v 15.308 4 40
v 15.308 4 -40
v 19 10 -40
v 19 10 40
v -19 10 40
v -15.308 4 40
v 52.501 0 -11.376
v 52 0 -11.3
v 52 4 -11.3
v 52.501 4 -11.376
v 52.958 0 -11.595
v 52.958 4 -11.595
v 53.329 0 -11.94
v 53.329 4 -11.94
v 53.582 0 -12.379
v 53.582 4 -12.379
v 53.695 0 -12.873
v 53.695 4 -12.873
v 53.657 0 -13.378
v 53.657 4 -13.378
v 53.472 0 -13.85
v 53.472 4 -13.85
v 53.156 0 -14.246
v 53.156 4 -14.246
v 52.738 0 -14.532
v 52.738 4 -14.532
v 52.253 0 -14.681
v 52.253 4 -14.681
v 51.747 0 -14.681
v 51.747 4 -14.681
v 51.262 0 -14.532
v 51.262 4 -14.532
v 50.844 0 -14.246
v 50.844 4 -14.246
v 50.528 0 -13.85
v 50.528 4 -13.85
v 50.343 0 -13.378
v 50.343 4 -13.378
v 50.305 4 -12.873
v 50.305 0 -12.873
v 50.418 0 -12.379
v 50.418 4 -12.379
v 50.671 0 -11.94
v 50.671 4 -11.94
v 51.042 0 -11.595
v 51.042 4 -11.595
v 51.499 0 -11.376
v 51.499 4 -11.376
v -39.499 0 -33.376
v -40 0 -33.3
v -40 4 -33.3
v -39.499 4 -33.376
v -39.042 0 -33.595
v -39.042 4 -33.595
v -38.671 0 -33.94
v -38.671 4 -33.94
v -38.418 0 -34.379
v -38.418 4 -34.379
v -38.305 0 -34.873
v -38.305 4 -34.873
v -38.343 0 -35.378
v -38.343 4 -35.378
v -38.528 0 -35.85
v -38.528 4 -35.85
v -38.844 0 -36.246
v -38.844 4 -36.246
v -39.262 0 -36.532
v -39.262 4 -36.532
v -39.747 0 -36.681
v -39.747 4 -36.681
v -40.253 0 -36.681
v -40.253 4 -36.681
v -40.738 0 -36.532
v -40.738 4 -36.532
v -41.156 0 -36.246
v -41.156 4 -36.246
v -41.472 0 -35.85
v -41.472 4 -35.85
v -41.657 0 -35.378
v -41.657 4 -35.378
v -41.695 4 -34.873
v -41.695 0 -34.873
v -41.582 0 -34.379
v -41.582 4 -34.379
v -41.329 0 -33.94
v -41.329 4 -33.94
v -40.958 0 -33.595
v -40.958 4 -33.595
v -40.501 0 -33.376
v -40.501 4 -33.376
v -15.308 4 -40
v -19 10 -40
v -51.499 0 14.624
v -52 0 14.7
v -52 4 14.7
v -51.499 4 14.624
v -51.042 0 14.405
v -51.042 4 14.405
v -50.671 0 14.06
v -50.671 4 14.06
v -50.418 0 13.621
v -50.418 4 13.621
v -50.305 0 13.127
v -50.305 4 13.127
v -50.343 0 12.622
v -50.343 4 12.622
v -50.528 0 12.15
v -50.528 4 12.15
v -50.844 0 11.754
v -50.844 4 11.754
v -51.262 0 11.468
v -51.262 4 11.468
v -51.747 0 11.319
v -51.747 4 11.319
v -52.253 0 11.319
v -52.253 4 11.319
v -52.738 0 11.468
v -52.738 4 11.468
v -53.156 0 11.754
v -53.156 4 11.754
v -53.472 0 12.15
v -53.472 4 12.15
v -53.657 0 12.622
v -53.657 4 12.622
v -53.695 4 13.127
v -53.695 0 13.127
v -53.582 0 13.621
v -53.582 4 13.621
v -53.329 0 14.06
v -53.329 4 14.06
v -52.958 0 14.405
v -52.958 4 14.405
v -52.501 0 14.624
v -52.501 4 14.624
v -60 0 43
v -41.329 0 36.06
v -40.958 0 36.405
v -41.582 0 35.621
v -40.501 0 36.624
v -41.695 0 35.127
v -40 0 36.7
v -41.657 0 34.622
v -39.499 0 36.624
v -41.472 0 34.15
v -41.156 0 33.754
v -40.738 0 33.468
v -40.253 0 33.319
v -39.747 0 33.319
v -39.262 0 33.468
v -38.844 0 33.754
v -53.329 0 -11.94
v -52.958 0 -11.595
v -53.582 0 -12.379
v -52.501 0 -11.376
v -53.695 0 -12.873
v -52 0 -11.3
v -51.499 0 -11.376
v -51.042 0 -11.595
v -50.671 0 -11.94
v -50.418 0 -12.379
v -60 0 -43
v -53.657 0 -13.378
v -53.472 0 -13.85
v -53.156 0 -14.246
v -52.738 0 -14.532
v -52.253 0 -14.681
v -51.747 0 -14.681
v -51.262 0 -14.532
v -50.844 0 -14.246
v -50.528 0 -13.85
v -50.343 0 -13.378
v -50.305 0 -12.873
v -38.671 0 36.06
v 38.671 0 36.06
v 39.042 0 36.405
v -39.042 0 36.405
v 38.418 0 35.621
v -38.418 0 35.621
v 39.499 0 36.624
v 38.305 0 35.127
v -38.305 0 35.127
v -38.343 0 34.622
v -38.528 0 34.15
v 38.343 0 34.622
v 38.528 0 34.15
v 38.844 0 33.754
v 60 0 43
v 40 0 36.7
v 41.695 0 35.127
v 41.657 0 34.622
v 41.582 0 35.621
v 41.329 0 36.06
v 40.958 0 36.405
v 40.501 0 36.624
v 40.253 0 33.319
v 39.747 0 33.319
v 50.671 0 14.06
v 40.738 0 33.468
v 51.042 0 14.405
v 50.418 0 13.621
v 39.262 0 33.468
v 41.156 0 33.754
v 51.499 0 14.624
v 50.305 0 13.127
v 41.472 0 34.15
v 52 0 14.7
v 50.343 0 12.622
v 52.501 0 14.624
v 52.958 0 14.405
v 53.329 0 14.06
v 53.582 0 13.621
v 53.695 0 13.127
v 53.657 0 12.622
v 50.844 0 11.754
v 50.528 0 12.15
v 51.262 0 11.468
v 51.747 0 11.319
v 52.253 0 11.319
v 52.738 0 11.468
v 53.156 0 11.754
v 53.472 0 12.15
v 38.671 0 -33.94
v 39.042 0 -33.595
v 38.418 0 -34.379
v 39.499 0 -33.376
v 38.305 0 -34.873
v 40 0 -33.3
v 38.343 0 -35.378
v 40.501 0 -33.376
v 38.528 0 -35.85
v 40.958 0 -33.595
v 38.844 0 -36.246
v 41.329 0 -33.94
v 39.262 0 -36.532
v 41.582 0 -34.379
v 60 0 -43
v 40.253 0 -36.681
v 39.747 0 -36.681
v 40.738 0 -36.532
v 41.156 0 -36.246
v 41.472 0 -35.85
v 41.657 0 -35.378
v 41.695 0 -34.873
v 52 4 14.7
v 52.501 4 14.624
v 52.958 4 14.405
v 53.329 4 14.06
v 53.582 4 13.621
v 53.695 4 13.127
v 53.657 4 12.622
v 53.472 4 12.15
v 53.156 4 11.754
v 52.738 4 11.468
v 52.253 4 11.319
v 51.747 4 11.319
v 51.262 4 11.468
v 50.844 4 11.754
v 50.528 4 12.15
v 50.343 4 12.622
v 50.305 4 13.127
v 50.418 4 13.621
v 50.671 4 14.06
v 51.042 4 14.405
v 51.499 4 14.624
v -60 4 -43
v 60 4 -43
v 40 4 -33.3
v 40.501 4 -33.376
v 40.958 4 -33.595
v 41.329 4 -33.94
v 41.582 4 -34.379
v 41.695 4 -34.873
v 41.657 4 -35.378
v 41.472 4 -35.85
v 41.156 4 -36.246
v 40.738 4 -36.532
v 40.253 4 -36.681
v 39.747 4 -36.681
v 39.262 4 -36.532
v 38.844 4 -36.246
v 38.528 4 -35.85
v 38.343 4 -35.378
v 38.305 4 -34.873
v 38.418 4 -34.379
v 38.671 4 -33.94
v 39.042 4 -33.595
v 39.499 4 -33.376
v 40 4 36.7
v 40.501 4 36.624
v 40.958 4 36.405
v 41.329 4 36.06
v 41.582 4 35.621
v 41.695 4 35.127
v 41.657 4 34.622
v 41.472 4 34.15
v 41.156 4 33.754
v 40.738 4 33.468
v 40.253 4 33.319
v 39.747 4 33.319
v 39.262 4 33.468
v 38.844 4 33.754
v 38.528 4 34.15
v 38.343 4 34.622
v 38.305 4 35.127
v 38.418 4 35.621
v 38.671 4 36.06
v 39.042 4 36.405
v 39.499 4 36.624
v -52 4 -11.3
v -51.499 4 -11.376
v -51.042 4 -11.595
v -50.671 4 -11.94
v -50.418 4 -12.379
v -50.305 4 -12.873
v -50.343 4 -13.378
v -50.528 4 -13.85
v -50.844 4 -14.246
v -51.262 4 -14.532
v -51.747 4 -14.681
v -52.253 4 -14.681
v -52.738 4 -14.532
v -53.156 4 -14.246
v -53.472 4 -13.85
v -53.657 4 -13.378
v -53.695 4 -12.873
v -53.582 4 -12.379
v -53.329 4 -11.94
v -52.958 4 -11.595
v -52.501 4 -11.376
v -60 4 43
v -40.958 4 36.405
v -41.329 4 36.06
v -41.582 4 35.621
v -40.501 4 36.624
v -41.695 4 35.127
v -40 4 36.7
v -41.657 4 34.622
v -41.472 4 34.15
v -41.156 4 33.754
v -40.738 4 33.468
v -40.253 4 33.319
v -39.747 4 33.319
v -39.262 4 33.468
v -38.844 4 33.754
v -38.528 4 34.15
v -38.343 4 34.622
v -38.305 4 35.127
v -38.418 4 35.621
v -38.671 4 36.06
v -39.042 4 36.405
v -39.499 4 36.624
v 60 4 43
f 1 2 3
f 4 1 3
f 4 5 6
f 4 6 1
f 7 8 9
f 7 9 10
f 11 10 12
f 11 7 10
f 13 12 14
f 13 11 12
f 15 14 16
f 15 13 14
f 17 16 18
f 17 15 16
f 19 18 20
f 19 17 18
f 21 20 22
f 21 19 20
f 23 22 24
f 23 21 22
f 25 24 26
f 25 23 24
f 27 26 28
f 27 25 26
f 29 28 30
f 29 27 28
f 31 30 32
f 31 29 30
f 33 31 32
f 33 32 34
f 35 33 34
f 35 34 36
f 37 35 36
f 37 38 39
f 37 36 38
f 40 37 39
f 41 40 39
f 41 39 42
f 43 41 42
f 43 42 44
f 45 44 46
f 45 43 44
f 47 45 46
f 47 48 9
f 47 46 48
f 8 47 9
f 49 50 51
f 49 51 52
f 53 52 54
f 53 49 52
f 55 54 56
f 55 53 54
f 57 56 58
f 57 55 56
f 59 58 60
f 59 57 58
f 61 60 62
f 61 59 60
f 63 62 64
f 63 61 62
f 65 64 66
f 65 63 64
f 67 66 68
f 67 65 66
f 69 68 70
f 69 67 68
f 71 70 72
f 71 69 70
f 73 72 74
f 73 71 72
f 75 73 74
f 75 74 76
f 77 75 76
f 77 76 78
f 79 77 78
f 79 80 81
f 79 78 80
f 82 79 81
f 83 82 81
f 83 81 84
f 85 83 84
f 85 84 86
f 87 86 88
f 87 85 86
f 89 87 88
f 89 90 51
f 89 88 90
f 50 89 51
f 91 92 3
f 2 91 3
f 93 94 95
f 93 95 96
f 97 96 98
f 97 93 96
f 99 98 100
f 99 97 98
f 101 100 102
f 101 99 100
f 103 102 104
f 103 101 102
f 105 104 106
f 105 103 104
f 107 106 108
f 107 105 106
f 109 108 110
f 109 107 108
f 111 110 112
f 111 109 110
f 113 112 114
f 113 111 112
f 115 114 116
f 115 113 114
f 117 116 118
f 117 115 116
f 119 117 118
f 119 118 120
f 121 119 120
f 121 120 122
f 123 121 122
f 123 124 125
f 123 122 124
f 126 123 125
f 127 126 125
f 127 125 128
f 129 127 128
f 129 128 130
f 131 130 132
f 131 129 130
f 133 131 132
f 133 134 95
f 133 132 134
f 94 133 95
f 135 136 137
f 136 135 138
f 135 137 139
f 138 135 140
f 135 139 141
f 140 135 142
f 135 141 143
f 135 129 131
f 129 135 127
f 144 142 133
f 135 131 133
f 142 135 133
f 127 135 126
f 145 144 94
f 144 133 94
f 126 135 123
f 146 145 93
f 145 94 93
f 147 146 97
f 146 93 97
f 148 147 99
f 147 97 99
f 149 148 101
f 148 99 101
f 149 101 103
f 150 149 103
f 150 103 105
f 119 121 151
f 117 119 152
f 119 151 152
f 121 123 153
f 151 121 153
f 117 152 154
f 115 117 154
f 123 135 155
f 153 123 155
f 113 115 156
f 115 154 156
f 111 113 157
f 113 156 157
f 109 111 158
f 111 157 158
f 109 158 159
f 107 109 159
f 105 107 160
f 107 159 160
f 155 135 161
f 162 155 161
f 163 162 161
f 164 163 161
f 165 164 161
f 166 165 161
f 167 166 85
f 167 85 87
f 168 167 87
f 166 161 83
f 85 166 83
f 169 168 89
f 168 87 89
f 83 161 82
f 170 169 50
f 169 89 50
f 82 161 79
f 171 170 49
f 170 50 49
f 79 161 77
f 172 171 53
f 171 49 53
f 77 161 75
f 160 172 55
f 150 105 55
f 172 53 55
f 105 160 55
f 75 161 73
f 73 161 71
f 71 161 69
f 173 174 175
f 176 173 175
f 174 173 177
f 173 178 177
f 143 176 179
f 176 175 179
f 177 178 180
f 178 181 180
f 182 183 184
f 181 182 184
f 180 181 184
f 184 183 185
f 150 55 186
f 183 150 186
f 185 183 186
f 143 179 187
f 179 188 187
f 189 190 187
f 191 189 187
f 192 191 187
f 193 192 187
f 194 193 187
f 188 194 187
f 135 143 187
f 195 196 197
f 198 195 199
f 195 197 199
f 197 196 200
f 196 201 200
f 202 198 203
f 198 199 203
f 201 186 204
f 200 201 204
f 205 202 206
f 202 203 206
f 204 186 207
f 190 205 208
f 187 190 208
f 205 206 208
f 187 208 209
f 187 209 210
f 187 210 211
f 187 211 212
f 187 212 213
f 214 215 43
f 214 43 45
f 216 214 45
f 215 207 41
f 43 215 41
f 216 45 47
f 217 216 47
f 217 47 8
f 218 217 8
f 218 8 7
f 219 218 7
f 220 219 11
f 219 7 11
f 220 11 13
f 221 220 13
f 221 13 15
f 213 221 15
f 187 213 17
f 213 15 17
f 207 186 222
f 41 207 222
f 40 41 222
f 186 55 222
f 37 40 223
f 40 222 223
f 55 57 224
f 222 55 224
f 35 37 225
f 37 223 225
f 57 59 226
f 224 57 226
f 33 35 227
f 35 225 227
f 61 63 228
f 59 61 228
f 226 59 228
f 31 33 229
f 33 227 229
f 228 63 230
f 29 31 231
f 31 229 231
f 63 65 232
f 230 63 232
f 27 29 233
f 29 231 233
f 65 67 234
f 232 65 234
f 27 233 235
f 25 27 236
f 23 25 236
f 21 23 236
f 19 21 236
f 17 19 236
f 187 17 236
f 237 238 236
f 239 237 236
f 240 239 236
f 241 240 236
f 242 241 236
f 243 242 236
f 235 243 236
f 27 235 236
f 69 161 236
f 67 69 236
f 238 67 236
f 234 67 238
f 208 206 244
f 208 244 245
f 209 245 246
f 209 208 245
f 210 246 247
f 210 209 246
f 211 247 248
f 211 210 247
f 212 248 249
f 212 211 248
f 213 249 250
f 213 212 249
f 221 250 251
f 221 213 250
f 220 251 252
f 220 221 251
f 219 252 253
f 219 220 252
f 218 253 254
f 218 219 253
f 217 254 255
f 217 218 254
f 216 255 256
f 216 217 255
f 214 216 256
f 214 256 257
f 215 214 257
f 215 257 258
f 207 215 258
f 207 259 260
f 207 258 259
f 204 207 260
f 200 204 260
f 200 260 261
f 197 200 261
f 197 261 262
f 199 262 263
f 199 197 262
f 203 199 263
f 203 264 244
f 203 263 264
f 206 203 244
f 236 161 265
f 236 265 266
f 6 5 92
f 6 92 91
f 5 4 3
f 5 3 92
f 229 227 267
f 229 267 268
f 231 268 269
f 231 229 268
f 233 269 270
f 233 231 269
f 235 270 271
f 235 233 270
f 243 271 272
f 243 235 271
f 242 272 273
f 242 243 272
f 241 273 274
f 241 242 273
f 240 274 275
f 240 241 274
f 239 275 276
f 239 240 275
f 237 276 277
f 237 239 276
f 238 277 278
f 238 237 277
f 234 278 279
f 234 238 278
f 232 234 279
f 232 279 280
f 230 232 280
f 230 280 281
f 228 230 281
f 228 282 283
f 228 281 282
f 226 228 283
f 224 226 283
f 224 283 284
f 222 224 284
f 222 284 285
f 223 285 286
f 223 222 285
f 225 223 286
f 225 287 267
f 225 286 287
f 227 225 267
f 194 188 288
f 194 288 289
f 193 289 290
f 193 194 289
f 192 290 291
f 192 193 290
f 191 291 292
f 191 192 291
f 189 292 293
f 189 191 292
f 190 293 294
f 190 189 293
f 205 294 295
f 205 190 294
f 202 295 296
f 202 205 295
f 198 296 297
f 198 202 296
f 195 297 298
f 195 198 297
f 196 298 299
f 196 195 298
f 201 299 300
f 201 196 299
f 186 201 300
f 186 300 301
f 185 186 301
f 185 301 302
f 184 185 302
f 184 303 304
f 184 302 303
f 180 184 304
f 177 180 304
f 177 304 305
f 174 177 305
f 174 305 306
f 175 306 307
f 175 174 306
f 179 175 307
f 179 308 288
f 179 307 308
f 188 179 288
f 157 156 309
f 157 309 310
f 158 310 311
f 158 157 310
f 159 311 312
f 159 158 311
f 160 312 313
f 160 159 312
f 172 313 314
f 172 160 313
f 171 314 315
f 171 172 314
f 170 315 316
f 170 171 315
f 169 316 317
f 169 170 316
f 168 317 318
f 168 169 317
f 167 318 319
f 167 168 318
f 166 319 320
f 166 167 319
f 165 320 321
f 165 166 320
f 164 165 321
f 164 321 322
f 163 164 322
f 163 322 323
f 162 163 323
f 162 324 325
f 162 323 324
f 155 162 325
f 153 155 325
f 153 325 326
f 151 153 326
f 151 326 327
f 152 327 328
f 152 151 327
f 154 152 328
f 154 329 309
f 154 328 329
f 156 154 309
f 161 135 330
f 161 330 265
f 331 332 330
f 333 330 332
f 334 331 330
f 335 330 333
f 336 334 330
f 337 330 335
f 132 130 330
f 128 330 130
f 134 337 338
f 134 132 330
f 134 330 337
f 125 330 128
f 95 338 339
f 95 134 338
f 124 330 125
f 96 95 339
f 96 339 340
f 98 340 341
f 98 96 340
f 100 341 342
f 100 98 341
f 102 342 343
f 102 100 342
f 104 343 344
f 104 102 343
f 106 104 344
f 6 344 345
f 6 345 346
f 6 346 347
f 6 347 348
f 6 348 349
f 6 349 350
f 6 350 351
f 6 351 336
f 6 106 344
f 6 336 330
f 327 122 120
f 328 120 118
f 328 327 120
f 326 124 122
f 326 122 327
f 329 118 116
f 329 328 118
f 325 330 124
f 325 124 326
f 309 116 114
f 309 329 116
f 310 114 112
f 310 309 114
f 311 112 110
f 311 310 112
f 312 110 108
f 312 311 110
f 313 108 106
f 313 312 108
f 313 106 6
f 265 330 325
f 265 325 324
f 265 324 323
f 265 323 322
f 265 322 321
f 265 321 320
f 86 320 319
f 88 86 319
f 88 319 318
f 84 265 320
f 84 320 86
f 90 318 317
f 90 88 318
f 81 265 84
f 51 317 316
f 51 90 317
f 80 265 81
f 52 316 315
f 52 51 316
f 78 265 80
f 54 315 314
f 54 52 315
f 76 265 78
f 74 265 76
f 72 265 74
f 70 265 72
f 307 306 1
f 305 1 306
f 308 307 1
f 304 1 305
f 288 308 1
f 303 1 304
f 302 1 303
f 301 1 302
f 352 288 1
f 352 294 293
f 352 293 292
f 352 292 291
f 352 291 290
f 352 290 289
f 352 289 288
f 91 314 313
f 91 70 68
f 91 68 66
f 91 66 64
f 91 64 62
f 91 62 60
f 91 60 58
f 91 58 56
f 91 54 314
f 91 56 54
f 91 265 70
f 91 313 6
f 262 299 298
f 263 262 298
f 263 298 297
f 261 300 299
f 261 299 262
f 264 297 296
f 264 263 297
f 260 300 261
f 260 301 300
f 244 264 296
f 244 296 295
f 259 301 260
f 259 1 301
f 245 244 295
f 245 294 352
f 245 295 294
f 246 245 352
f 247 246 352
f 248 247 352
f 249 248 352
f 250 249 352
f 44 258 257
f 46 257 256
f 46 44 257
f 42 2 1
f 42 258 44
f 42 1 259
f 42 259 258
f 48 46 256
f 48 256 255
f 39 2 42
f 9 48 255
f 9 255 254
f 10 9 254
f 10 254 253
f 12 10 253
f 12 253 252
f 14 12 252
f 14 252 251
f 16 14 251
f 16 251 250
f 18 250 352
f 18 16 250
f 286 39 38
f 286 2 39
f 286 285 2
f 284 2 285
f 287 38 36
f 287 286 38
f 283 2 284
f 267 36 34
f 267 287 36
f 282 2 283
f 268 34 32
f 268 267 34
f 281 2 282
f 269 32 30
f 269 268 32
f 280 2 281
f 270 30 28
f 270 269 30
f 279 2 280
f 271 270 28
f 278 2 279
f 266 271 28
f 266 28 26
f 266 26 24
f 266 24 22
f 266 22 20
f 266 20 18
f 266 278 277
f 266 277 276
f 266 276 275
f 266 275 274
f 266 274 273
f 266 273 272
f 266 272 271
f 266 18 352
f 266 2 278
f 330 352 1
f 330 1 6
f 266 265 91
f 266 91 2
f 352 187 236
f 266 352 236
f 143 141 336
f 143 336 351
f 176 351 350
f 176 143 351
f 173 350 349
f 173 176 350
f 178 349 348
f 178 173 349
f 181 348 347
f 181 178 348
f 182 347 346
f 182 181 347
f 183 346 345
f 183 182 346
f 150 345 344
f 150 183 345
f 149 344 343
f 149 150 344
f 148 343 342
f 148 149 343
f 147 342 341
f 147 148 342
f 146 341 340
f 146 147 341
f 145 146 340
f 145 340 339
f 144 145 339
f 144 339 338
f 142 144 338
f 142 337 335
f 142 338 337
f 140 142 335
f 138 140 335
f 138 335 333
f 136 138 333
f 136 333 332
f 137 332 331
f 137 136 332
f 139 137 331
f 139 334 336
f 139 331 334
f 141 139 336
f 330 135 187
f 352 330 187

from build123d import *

# Parameters (mm, degrees)
SKETCH1_W             = 120
SKETCH1_H             = 86
RAIL_PLATE_DEPTH      = 4
DOVETAIL_RAIL_DEPTH   = 40
BOLT_HOLES_DEPTH      = 75.491610266
BOLT_HOLES_DEPTH_BACK = 75.491610266
SKETCH3_R             = 1.7


with BuildPart() as part:
    # Sketch1 → Rail Plate (new body)
    with BuildSketch(Plane(origin=(0, 0, 0), x_dir=(1, 0, 0), z_dir=(0, 1, 0))):
        Rectangle(SKETCH1_W, SKETCH1_H)
    extrude(amount=RAIL_PLATE_DEPTH)

    # Sketch2 → Dovetail Rail (add, symmetric)
    with BuildSketch(Plane.XY):
        Polygon((-15, 3.5), (15, 3.5), (19, 10), (-19, 10), align=None)
    extrude(amount=DOVETAIL_RAIL_DEPTH, both=True)

    # Sketch3 → Bolt Holes (cut, two sides: drawn at the far end of the back side and taken through both)
    with BuildSketch(Plane(origin=(0, 0, 0), x_dir=(1, 0, 0), z_dir=(0, 1, 0)).offset(-BOLT_HOLES_DEPTH_BACK)):
        with Locations(Location((-40, -35, 0), (0, 0, 270))):
            Circle(SKETCH3_R)
        with Locations(Location((-40, 35, 0), (0, 0, 270))):
            Circle(SKETCH3_R)
        with Locations(Location((40, -35, 0), (0, 0, 270))):
            Circle(SKETCH3_R)
        with Locations(Location((40, 35, 0), (0, 0, 270))):
            Circle(SKETCH3_R)
        with Locations(Location((-52, -13, 0), (0, 0, 270))):
            Circle(SKETCH3_R)
        with Locations(Location((-52, 13, 0), (0, 0, 270))):
            Circle(SKETCH3_R)
        with Locations(Location((52, -13, 0), (0, 0, 270))):
            Circle(SKETCH3_R)
        with Locations(Location((52, 13, 0), (0, 0, 270))):
            Circle(SKETCH3_R)
    extrude(amount=BOLT_HOLES_DEPTH + BOLT_HOLES_DEPTH_BACK, mode=Mode.SUBTRACT)


solid = part.part
